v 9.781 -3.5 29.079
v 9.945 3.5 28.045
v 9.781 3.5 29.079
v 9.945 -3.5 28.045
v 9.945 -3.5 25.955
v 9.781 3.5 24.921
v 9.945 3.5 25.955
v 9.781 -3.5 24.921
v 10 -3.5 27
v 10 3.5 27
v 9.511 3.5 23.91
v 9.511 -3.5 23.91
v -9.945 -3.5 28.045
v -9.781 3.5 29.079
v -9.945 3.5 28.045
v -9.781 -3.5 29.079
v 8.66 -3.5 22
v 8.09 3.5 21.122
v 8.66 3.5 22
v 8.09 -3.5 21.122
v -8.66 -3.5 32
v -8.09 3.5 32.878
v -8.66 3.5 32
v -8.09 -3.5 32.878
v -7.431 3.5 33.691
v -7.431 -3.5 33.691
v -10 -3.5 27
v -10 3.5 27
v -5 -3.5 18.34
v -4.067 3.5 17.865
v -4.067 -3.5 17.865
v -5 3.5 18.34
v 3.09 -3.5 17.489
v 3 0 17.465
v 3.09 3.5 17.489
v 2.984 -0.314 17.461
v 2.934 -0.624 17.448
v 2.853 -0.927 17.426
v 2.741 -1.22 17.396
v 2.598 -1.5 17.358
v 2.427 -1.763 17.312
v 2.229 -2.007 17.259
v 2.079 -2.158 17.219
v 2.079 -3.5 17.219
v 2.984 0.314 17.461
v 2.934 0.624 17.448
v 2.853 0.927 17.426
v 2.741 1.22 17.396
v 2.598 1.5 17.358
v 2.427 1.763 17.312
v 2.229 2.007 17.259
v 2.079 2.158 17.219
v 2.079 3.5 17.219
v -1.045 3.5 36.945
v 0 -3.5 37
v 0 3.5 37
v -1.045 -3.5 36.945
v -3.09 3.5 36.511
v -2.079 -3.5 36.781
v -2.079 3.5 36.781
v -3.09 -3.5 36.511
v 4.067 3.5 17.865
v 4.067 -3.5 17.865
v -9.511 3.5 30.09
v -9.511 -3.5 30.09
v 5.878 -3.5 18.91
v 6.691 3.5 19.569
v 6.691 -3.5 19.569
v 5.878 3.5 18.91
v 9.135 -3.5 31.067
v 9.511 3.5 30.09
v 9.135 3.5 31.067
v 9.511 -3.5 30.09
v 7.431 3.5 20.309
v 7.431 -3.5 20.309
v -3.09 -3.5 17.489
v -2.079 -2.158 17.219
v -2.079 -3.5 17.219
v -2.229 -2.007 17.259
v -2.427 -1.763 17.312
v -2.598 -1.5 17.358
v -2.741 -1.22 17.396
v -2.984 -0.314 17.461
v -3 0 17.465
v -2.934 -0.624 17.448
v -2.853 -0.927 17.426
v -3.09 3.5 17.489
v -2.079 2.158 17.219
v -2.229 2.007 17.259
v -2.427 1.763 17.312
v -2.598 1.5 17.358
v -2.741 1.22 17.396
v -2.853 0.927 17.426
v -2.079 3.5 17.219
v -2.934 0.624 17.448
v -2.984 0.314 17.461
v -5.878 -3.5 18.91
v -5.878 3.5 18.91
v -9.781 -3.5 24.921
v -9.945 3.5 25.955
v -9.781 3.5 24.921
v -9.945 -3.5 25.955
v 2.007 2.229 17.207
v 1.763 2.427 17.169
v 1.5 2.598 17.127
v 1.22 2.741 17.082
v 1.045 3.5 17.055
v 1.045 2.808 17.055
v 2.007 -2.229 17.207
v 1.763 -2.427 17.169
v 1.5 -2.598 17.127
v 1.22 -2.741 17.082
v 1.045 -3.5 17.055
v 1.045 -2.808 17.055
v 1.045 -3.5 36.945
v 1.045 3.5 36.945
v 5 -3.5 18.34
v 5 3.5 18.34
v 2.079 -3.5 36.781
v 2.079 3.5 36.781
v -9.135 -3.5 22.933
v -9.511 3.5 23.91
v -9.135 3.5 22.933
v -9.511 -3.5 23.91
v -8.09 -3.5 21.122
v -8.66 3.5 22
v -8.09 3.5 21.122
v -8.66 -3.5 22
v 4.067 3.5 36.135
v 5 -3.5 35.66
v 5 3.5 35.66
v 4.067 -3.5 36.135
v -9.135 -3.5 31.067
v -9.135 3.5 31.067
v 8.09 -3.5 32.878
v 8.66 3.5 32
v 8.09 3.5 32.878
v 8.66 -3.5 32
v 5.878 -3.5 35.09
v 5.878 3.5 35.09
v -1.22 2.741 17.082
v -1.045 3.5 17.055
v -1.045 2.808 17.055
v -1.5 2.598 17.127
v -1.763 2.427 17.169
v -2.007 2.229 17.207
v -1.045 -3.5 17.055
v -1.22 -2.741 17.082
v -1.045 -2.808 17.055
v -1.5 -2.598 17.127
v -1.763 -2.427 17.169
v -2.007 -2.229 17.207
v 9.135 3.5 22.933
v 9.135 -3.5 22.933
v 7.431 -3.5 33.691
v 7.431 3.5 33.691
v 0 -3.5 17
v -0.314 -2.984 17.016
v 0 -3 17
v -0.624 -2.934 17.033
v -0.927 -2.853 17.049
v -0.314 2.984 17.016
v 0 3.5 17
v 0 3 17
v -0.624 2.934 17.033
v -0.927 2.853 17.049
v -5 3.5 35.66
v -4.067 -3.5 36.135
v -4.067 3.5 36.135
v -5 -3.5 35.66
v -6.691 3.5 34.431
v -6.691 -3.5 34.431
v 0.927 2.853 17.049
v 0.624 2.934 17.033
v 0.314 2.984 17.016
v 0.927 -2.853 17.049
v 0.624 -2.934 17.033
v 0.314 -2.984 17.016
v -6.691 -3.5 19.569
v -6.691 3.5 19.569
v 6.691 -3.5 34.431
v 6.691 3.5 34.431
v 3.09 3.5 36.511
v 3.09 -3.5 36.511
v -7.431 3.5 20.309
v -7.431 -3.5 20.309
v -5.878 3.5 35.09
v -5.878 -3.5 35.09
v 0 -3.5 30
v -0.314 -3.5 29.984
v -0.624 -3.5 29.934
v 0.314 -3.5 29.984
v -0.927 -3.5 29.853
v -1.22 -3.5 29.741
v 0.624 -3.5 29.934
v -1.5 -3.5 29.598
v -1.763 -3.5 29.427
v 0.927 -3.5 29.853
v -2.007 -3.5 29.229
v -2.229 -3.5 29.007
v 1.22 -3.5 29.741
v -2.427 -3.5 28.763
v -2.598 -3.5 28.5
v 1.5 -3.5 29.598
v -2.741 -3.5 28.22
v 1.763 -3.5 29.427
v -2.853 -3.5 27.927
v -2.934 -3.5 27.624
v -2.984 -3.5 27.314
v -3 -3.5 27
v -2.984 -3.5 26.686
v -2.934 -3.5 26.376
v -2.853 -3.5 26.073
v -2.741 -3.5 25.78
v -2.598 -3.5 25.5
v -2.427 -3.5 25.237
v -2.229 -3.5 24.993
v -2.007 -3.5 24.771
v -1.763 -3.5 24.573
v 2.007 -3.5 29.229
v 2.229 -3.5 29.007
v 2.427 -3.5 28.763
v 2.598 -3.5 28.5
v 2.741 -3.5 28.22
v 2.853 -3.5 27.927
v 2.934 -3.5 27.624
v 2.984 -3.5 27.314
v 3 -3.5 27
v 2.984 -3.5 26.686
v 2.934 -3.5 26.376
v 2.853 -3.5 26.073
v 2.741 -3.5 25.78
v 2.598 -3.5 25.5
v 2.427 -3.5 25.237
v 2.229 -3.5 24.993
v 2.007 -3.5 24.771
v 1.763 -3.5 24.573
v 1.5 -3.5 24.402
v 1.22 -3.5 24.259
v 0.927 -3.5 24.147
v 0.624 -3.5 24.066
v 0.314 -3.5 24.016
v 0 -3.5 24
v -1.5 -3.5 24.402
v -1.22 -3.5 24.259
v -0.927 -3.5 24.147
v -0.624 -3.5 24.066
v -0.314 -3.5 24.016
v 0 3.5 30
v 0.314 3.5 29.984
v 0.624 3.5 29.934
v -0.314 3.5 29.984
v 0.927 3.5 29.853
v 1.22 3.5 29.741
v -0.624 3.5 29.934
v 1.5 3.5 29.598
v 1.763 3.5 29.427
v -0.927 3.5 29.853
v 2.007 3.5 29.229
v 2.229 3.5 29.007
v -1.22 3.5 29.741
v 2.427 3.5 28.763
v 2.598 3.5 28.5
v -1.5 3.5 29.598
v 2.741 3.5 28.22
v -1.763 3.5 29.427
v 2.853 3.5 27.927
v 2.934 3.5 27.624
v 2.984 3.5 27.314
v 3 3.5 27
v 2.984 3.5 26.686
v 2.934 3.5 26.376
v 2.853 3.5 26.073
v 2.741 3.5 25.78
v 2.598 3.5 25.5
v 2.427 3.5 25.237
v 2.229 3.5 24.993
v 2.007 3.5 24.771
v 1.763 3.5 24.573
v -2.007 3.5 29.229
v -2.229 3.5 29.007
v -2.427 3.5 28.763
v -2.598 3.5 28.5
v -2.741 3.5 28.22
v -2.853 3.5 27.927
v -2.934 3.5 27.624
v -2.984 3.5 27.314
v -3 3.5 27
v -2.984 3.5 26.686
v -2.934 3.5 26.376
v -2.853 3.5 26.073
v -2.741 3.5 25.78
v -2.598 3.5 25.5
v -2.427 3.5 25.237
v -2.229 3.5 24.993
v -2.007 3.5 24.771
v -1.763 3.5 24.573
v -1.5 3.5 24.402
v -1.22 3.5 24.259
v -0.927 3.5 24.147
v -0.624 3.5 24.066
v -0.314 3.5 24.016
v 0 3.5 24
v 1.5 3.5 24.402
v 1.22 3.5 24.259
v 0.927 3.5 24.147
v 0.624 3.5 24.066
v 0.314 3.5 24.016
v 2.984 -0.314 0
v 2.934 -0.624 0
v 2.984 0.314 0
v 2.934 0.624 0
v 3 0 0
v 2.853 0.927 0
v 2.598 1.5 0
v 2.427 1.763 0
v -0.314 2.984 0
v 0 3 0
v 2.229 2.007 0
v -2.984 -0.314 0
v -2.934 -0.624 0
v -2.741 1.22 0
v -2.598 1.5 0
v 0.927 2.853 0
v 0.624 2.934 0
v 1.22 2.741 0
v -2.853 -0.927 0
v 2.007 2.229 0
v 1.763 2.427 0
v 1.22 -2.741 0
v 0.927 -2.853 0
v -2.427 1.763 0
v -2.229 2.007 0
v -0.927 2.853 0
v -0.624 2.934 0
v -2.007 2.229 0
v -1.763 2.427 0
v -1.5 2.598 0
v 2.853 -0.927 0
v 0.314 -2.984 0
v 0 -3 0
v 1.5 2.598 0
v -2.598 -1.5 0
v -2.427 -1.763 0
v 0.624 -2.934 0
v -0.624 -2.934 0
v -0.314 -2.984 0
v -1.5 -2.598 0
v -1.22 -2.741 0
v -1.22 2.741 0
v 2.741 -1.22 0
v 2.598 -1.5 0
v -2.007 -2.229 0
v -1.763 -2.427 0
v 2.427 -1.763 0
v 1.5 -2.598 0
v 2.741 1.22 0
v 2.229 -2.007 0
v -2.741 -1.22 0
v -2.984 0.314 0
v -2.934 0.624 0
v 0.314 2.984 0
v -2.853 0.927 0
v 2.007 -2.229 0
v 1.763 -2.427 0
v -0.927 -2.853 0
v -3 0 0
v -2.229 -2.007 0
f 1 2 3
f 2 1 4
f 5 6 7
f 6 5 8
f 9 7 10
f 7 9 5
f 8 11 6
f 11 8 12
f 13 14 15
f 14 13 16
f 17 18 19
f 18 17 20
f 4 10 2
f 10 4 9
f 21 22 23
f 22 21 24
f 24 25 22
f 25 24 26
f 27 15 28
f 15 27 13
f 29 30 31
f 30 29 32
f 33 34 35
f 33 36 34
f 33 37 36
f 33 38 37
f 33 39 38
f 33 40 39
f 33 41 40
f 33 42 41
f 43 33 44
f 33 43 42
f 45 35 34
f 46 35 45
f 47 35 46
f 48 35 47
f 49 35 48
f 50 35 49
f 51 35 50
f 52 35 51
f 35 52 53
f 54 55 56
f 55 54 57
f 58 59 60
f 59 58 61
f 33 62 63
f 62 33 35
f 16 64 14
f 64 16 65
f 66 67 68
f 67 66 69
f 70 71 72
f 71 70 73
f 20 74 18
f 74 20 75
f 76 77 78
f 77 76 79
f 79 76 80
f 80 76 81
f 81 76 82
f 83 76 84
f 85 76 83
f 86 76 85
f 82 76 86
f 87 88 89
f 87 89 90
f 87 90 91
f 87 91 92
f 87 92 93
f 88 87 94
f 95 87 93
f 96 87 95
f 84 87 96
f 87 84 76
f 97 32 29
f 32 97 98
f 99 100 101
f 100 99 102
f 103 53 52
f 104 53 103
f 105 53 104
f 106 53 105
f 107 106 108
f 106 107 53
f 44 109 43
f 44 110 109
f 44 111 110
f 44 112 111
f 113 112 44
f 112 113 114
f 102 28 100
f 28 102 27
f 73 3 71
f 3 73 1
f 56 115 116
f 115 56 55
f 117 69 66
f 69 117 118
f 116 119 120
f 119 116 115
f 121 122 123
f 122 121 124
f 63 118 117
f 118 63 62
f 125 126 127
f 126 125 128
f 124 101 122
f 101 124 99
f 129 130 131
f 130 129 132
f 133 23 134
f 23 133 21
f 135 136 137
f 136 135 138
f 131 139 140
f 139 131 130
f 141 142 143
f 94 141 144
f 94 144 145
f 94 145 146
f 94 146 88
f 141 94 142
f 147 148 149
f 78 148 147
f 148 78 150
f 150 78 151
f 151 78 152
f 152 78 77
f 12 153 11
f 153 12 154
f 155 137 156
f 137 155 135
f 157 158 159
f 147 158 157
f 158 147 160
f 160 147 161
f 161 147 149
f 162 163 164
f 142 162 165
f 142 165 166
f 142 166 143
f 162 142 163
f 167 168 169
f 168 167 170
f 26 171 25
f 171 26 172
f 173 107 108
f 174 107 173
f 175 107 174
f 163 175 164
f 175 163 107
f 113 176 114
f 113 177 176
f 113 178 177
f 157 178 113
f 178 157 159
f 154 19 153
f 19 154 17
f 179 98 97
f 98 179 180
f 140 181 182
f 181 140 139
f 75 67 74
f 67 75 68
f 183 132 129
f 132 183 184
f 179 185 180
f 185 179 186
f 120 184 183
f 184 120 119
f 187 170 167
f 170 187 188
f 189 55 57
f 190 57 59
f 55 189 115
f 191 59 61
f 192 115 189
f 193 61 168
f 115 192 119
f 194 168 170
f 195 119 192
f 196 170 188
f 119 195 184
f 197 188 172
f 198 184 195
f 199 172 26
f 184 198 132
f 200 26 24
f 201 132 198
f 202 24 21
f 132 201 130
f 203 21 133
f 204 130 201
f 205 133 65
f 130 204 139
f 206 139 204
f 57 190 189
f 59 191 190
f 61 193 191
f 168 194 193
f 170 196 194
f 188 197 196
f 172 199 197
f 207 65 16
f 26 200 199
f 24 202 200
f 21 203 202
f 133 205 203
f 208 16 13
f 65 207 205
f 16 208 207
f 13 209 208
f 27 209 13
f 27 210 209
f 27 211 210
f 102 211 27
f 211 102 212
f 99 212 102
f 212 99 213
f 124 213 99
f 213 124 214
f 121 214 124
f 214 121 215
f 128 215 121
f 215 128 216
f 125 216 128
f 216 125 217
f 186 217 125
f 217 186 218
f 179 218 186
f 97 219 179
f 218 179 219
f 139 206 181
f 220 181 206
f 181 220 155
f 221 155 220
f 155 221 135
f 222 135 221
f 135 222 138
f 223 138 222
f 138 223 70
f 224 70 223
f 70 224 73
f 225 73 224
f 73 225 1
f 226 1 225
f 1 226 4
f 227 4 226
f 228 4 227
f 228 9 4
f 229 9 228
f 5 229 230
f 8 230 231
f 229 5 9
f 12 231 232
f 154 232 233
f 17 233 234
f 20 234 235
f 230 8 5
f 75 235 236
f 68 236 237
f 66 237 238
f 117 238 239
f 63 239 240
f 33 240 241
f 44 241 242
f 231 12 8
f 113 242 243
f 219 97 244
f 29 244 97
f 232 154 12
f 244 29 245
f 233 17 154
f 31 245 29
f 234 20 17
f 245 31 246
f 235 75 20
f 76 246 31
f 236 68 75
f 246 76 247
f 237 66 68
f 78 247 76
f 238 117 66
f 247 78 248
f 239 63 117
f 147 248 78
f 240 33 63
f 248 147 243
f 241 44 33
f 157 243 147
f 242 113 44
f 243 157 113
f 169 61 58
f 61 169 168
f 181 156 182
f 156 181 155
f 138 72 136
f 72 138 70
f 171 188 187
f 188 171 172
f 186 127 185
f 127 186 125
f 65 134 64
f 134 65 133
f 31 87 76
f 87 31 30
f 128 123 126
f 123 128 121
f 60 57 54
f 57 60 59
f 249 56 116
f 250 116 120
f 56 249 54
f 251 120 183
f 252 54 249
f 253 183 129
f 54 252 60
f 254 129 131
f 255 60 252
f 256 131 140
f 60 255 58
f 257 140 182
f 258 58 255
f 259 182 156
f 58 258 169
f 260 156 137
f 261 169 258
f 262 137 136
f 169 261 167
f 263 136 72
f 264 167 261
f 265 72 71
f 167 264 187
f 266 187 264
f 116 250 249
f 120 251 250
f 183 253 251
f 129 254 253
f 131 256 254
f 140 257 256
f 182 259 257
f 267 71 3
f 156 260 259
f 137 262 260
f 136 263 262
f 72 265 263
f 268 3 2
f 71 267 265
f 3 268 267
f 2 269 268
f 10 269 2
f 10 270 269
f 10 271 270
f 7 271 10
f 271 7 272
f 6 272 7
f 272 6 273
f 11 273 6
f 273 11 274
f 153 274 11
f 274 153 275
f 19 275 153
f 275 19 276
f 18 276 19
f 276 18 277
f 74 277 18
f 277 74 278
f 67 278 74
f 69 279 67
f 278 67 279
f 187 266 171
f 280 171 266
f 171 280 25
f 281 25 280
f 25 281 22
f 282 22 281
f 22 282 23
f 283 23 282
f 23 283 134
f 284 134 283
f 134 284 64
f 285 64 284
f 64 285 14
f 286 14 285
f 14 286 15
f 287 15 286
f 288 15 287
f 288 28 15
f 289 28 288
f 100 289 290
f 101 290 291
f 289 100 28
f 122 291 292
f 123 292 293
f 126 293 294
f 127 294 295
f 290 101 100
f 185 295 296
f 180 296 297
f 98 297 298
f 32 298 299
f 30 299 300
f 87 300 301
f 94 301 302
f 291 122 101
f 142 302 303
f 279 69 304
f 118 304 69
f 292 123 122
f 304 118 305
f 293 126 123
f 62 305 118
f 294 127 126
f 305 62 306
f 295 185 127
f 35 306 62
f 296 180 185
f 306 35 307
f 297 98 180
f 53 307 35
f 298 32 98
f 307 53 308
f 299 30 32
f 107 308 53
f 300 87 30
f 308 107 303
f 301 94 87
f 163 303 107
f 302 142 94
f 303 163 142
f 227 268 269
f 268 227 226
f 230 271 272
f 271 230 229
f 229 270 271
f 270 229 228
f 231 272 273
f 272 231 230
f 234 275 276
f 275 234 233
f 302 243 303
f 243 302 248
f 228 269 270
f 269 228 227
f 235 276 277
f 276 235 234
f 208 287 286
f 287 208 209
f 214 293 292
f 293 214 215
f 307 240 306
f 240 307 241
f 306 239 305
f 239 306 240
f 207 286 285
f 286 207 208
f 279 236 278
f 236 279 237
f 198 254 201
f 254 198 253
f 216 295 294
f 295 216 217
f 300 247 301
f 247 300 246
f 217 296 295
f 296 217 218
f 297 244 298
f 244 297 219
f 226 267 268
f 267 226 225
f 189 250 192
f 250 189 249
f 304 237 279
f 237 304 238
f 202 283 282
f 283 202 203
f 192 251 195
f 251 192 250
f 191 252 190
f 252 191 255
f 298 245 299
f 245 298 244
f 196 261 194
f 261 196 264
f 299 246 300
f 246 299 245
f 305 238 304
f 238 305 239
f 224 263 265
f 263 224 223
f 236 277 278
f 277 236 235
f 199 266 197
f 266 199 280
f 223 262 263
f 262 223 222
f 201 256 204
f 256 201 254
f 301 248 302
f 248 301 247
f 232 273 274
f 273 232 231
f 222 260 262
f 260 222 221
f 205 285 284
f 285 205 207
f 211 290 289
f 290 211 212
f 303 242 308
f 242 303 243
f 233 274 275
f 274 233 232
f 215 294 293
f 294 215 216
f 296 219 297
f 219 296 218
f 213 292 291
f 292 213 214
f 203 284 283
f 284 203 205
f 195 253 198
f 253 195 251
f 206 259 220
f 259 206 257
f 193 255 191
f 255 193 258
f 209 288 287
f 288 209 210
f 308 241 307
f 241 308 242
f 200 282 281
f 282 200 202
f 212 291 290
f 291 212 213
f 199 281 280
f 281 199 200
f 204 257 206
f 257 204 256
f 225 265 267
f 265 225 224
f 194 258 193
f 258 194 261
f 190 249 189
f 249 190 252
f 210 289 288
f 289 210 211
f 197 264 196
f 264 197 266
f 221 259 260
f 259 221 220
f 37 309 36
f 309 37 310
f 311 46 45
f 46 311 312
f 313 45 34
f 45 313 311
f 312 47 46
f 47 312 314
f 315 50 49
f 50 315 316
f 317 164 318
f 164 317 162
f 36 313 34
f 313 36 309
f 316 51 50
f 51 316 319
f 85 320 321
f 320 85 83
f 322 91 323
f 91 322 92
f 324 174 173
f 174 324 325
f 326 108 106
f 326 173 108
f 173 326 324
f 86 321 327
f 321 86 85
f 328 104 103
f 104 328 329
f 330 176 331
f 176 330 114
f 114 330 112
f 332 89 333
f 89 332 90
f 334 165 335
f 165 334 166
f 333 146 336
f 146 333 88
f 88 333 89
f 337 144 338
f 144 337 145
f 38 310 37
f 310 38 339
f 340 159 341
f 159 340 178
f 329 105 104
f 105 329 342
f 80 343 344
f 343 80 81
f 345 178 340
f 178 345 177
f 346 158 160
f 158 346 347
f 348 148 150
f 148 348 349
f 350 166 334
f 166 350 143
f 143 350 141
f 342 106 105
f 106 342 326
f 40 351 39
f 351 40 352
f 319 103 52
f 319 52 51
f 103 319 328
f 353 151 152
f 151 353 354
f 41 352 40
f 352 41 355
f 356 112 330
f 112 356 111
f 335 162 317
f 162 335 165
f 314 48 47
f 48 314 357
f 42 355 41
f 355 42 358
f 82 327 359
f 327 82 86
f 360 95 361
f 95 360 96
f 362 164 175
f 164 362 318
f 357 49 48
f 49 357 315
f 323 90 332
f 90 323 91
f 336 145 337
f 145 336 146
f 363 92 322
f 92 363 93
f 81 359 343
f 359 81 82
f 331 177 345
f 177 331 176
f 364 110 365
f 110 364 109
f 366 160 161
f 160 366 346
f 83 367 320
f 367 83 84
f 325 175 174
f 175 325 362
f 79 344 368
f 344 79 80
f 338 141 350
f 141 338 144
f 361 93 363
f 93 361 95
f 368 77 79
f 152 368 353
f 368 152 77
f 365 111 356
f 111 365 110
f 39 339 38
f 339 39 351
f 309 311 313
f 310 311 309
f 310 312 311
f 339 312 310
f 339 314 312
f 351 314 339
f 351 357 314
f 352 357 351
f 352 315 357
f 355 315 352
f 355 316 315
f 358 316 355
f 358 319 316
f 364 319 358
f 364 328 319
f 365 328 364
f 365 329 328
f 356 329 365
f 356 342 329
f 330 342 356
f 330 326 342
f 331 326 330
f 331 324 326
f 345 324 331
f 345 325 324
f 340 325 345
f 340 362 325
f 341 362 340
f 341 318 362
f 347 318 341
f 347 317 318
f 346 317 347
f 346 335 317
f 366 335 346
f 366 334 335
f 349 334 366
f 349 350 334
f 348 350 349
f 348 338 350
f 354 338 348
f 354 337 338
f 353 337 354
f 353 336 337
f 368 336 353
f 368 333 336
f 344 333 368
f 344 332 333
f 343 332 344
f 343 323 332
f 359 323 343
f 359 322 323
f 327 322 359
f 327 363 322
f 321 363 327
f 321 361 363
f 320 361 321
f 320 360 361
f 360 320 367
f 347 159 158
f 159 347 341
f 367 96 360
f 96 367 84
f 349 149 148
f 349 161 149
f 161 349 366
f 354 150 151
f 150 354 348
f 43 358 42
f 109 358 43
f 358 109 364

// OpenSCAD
// Flat-eye bolt with a smooth shaft.
$fn = 60;
eps = 0.02;
shaft_d = 6;
shaft_l = 18;
eye_outer_d = 20;
eye_inner_d = eye_outer_d - 2 * 7;
eye_t = 7;
module eye() {
    translate([0, -eye_t / 2, shaft_l + eye_outer_d / 2 - 1]) rotate([-90, 0, 0])
        difference() { cylinder(d = eye_outer_d, h = eye_t); translate([0, 0, -eps]) cylinder(d = eye_inner_d, h = eye_t + 2 * eps); }
}
union() { cylinder(d = shaft_d, h = shaft_l + 2); eye(); }
